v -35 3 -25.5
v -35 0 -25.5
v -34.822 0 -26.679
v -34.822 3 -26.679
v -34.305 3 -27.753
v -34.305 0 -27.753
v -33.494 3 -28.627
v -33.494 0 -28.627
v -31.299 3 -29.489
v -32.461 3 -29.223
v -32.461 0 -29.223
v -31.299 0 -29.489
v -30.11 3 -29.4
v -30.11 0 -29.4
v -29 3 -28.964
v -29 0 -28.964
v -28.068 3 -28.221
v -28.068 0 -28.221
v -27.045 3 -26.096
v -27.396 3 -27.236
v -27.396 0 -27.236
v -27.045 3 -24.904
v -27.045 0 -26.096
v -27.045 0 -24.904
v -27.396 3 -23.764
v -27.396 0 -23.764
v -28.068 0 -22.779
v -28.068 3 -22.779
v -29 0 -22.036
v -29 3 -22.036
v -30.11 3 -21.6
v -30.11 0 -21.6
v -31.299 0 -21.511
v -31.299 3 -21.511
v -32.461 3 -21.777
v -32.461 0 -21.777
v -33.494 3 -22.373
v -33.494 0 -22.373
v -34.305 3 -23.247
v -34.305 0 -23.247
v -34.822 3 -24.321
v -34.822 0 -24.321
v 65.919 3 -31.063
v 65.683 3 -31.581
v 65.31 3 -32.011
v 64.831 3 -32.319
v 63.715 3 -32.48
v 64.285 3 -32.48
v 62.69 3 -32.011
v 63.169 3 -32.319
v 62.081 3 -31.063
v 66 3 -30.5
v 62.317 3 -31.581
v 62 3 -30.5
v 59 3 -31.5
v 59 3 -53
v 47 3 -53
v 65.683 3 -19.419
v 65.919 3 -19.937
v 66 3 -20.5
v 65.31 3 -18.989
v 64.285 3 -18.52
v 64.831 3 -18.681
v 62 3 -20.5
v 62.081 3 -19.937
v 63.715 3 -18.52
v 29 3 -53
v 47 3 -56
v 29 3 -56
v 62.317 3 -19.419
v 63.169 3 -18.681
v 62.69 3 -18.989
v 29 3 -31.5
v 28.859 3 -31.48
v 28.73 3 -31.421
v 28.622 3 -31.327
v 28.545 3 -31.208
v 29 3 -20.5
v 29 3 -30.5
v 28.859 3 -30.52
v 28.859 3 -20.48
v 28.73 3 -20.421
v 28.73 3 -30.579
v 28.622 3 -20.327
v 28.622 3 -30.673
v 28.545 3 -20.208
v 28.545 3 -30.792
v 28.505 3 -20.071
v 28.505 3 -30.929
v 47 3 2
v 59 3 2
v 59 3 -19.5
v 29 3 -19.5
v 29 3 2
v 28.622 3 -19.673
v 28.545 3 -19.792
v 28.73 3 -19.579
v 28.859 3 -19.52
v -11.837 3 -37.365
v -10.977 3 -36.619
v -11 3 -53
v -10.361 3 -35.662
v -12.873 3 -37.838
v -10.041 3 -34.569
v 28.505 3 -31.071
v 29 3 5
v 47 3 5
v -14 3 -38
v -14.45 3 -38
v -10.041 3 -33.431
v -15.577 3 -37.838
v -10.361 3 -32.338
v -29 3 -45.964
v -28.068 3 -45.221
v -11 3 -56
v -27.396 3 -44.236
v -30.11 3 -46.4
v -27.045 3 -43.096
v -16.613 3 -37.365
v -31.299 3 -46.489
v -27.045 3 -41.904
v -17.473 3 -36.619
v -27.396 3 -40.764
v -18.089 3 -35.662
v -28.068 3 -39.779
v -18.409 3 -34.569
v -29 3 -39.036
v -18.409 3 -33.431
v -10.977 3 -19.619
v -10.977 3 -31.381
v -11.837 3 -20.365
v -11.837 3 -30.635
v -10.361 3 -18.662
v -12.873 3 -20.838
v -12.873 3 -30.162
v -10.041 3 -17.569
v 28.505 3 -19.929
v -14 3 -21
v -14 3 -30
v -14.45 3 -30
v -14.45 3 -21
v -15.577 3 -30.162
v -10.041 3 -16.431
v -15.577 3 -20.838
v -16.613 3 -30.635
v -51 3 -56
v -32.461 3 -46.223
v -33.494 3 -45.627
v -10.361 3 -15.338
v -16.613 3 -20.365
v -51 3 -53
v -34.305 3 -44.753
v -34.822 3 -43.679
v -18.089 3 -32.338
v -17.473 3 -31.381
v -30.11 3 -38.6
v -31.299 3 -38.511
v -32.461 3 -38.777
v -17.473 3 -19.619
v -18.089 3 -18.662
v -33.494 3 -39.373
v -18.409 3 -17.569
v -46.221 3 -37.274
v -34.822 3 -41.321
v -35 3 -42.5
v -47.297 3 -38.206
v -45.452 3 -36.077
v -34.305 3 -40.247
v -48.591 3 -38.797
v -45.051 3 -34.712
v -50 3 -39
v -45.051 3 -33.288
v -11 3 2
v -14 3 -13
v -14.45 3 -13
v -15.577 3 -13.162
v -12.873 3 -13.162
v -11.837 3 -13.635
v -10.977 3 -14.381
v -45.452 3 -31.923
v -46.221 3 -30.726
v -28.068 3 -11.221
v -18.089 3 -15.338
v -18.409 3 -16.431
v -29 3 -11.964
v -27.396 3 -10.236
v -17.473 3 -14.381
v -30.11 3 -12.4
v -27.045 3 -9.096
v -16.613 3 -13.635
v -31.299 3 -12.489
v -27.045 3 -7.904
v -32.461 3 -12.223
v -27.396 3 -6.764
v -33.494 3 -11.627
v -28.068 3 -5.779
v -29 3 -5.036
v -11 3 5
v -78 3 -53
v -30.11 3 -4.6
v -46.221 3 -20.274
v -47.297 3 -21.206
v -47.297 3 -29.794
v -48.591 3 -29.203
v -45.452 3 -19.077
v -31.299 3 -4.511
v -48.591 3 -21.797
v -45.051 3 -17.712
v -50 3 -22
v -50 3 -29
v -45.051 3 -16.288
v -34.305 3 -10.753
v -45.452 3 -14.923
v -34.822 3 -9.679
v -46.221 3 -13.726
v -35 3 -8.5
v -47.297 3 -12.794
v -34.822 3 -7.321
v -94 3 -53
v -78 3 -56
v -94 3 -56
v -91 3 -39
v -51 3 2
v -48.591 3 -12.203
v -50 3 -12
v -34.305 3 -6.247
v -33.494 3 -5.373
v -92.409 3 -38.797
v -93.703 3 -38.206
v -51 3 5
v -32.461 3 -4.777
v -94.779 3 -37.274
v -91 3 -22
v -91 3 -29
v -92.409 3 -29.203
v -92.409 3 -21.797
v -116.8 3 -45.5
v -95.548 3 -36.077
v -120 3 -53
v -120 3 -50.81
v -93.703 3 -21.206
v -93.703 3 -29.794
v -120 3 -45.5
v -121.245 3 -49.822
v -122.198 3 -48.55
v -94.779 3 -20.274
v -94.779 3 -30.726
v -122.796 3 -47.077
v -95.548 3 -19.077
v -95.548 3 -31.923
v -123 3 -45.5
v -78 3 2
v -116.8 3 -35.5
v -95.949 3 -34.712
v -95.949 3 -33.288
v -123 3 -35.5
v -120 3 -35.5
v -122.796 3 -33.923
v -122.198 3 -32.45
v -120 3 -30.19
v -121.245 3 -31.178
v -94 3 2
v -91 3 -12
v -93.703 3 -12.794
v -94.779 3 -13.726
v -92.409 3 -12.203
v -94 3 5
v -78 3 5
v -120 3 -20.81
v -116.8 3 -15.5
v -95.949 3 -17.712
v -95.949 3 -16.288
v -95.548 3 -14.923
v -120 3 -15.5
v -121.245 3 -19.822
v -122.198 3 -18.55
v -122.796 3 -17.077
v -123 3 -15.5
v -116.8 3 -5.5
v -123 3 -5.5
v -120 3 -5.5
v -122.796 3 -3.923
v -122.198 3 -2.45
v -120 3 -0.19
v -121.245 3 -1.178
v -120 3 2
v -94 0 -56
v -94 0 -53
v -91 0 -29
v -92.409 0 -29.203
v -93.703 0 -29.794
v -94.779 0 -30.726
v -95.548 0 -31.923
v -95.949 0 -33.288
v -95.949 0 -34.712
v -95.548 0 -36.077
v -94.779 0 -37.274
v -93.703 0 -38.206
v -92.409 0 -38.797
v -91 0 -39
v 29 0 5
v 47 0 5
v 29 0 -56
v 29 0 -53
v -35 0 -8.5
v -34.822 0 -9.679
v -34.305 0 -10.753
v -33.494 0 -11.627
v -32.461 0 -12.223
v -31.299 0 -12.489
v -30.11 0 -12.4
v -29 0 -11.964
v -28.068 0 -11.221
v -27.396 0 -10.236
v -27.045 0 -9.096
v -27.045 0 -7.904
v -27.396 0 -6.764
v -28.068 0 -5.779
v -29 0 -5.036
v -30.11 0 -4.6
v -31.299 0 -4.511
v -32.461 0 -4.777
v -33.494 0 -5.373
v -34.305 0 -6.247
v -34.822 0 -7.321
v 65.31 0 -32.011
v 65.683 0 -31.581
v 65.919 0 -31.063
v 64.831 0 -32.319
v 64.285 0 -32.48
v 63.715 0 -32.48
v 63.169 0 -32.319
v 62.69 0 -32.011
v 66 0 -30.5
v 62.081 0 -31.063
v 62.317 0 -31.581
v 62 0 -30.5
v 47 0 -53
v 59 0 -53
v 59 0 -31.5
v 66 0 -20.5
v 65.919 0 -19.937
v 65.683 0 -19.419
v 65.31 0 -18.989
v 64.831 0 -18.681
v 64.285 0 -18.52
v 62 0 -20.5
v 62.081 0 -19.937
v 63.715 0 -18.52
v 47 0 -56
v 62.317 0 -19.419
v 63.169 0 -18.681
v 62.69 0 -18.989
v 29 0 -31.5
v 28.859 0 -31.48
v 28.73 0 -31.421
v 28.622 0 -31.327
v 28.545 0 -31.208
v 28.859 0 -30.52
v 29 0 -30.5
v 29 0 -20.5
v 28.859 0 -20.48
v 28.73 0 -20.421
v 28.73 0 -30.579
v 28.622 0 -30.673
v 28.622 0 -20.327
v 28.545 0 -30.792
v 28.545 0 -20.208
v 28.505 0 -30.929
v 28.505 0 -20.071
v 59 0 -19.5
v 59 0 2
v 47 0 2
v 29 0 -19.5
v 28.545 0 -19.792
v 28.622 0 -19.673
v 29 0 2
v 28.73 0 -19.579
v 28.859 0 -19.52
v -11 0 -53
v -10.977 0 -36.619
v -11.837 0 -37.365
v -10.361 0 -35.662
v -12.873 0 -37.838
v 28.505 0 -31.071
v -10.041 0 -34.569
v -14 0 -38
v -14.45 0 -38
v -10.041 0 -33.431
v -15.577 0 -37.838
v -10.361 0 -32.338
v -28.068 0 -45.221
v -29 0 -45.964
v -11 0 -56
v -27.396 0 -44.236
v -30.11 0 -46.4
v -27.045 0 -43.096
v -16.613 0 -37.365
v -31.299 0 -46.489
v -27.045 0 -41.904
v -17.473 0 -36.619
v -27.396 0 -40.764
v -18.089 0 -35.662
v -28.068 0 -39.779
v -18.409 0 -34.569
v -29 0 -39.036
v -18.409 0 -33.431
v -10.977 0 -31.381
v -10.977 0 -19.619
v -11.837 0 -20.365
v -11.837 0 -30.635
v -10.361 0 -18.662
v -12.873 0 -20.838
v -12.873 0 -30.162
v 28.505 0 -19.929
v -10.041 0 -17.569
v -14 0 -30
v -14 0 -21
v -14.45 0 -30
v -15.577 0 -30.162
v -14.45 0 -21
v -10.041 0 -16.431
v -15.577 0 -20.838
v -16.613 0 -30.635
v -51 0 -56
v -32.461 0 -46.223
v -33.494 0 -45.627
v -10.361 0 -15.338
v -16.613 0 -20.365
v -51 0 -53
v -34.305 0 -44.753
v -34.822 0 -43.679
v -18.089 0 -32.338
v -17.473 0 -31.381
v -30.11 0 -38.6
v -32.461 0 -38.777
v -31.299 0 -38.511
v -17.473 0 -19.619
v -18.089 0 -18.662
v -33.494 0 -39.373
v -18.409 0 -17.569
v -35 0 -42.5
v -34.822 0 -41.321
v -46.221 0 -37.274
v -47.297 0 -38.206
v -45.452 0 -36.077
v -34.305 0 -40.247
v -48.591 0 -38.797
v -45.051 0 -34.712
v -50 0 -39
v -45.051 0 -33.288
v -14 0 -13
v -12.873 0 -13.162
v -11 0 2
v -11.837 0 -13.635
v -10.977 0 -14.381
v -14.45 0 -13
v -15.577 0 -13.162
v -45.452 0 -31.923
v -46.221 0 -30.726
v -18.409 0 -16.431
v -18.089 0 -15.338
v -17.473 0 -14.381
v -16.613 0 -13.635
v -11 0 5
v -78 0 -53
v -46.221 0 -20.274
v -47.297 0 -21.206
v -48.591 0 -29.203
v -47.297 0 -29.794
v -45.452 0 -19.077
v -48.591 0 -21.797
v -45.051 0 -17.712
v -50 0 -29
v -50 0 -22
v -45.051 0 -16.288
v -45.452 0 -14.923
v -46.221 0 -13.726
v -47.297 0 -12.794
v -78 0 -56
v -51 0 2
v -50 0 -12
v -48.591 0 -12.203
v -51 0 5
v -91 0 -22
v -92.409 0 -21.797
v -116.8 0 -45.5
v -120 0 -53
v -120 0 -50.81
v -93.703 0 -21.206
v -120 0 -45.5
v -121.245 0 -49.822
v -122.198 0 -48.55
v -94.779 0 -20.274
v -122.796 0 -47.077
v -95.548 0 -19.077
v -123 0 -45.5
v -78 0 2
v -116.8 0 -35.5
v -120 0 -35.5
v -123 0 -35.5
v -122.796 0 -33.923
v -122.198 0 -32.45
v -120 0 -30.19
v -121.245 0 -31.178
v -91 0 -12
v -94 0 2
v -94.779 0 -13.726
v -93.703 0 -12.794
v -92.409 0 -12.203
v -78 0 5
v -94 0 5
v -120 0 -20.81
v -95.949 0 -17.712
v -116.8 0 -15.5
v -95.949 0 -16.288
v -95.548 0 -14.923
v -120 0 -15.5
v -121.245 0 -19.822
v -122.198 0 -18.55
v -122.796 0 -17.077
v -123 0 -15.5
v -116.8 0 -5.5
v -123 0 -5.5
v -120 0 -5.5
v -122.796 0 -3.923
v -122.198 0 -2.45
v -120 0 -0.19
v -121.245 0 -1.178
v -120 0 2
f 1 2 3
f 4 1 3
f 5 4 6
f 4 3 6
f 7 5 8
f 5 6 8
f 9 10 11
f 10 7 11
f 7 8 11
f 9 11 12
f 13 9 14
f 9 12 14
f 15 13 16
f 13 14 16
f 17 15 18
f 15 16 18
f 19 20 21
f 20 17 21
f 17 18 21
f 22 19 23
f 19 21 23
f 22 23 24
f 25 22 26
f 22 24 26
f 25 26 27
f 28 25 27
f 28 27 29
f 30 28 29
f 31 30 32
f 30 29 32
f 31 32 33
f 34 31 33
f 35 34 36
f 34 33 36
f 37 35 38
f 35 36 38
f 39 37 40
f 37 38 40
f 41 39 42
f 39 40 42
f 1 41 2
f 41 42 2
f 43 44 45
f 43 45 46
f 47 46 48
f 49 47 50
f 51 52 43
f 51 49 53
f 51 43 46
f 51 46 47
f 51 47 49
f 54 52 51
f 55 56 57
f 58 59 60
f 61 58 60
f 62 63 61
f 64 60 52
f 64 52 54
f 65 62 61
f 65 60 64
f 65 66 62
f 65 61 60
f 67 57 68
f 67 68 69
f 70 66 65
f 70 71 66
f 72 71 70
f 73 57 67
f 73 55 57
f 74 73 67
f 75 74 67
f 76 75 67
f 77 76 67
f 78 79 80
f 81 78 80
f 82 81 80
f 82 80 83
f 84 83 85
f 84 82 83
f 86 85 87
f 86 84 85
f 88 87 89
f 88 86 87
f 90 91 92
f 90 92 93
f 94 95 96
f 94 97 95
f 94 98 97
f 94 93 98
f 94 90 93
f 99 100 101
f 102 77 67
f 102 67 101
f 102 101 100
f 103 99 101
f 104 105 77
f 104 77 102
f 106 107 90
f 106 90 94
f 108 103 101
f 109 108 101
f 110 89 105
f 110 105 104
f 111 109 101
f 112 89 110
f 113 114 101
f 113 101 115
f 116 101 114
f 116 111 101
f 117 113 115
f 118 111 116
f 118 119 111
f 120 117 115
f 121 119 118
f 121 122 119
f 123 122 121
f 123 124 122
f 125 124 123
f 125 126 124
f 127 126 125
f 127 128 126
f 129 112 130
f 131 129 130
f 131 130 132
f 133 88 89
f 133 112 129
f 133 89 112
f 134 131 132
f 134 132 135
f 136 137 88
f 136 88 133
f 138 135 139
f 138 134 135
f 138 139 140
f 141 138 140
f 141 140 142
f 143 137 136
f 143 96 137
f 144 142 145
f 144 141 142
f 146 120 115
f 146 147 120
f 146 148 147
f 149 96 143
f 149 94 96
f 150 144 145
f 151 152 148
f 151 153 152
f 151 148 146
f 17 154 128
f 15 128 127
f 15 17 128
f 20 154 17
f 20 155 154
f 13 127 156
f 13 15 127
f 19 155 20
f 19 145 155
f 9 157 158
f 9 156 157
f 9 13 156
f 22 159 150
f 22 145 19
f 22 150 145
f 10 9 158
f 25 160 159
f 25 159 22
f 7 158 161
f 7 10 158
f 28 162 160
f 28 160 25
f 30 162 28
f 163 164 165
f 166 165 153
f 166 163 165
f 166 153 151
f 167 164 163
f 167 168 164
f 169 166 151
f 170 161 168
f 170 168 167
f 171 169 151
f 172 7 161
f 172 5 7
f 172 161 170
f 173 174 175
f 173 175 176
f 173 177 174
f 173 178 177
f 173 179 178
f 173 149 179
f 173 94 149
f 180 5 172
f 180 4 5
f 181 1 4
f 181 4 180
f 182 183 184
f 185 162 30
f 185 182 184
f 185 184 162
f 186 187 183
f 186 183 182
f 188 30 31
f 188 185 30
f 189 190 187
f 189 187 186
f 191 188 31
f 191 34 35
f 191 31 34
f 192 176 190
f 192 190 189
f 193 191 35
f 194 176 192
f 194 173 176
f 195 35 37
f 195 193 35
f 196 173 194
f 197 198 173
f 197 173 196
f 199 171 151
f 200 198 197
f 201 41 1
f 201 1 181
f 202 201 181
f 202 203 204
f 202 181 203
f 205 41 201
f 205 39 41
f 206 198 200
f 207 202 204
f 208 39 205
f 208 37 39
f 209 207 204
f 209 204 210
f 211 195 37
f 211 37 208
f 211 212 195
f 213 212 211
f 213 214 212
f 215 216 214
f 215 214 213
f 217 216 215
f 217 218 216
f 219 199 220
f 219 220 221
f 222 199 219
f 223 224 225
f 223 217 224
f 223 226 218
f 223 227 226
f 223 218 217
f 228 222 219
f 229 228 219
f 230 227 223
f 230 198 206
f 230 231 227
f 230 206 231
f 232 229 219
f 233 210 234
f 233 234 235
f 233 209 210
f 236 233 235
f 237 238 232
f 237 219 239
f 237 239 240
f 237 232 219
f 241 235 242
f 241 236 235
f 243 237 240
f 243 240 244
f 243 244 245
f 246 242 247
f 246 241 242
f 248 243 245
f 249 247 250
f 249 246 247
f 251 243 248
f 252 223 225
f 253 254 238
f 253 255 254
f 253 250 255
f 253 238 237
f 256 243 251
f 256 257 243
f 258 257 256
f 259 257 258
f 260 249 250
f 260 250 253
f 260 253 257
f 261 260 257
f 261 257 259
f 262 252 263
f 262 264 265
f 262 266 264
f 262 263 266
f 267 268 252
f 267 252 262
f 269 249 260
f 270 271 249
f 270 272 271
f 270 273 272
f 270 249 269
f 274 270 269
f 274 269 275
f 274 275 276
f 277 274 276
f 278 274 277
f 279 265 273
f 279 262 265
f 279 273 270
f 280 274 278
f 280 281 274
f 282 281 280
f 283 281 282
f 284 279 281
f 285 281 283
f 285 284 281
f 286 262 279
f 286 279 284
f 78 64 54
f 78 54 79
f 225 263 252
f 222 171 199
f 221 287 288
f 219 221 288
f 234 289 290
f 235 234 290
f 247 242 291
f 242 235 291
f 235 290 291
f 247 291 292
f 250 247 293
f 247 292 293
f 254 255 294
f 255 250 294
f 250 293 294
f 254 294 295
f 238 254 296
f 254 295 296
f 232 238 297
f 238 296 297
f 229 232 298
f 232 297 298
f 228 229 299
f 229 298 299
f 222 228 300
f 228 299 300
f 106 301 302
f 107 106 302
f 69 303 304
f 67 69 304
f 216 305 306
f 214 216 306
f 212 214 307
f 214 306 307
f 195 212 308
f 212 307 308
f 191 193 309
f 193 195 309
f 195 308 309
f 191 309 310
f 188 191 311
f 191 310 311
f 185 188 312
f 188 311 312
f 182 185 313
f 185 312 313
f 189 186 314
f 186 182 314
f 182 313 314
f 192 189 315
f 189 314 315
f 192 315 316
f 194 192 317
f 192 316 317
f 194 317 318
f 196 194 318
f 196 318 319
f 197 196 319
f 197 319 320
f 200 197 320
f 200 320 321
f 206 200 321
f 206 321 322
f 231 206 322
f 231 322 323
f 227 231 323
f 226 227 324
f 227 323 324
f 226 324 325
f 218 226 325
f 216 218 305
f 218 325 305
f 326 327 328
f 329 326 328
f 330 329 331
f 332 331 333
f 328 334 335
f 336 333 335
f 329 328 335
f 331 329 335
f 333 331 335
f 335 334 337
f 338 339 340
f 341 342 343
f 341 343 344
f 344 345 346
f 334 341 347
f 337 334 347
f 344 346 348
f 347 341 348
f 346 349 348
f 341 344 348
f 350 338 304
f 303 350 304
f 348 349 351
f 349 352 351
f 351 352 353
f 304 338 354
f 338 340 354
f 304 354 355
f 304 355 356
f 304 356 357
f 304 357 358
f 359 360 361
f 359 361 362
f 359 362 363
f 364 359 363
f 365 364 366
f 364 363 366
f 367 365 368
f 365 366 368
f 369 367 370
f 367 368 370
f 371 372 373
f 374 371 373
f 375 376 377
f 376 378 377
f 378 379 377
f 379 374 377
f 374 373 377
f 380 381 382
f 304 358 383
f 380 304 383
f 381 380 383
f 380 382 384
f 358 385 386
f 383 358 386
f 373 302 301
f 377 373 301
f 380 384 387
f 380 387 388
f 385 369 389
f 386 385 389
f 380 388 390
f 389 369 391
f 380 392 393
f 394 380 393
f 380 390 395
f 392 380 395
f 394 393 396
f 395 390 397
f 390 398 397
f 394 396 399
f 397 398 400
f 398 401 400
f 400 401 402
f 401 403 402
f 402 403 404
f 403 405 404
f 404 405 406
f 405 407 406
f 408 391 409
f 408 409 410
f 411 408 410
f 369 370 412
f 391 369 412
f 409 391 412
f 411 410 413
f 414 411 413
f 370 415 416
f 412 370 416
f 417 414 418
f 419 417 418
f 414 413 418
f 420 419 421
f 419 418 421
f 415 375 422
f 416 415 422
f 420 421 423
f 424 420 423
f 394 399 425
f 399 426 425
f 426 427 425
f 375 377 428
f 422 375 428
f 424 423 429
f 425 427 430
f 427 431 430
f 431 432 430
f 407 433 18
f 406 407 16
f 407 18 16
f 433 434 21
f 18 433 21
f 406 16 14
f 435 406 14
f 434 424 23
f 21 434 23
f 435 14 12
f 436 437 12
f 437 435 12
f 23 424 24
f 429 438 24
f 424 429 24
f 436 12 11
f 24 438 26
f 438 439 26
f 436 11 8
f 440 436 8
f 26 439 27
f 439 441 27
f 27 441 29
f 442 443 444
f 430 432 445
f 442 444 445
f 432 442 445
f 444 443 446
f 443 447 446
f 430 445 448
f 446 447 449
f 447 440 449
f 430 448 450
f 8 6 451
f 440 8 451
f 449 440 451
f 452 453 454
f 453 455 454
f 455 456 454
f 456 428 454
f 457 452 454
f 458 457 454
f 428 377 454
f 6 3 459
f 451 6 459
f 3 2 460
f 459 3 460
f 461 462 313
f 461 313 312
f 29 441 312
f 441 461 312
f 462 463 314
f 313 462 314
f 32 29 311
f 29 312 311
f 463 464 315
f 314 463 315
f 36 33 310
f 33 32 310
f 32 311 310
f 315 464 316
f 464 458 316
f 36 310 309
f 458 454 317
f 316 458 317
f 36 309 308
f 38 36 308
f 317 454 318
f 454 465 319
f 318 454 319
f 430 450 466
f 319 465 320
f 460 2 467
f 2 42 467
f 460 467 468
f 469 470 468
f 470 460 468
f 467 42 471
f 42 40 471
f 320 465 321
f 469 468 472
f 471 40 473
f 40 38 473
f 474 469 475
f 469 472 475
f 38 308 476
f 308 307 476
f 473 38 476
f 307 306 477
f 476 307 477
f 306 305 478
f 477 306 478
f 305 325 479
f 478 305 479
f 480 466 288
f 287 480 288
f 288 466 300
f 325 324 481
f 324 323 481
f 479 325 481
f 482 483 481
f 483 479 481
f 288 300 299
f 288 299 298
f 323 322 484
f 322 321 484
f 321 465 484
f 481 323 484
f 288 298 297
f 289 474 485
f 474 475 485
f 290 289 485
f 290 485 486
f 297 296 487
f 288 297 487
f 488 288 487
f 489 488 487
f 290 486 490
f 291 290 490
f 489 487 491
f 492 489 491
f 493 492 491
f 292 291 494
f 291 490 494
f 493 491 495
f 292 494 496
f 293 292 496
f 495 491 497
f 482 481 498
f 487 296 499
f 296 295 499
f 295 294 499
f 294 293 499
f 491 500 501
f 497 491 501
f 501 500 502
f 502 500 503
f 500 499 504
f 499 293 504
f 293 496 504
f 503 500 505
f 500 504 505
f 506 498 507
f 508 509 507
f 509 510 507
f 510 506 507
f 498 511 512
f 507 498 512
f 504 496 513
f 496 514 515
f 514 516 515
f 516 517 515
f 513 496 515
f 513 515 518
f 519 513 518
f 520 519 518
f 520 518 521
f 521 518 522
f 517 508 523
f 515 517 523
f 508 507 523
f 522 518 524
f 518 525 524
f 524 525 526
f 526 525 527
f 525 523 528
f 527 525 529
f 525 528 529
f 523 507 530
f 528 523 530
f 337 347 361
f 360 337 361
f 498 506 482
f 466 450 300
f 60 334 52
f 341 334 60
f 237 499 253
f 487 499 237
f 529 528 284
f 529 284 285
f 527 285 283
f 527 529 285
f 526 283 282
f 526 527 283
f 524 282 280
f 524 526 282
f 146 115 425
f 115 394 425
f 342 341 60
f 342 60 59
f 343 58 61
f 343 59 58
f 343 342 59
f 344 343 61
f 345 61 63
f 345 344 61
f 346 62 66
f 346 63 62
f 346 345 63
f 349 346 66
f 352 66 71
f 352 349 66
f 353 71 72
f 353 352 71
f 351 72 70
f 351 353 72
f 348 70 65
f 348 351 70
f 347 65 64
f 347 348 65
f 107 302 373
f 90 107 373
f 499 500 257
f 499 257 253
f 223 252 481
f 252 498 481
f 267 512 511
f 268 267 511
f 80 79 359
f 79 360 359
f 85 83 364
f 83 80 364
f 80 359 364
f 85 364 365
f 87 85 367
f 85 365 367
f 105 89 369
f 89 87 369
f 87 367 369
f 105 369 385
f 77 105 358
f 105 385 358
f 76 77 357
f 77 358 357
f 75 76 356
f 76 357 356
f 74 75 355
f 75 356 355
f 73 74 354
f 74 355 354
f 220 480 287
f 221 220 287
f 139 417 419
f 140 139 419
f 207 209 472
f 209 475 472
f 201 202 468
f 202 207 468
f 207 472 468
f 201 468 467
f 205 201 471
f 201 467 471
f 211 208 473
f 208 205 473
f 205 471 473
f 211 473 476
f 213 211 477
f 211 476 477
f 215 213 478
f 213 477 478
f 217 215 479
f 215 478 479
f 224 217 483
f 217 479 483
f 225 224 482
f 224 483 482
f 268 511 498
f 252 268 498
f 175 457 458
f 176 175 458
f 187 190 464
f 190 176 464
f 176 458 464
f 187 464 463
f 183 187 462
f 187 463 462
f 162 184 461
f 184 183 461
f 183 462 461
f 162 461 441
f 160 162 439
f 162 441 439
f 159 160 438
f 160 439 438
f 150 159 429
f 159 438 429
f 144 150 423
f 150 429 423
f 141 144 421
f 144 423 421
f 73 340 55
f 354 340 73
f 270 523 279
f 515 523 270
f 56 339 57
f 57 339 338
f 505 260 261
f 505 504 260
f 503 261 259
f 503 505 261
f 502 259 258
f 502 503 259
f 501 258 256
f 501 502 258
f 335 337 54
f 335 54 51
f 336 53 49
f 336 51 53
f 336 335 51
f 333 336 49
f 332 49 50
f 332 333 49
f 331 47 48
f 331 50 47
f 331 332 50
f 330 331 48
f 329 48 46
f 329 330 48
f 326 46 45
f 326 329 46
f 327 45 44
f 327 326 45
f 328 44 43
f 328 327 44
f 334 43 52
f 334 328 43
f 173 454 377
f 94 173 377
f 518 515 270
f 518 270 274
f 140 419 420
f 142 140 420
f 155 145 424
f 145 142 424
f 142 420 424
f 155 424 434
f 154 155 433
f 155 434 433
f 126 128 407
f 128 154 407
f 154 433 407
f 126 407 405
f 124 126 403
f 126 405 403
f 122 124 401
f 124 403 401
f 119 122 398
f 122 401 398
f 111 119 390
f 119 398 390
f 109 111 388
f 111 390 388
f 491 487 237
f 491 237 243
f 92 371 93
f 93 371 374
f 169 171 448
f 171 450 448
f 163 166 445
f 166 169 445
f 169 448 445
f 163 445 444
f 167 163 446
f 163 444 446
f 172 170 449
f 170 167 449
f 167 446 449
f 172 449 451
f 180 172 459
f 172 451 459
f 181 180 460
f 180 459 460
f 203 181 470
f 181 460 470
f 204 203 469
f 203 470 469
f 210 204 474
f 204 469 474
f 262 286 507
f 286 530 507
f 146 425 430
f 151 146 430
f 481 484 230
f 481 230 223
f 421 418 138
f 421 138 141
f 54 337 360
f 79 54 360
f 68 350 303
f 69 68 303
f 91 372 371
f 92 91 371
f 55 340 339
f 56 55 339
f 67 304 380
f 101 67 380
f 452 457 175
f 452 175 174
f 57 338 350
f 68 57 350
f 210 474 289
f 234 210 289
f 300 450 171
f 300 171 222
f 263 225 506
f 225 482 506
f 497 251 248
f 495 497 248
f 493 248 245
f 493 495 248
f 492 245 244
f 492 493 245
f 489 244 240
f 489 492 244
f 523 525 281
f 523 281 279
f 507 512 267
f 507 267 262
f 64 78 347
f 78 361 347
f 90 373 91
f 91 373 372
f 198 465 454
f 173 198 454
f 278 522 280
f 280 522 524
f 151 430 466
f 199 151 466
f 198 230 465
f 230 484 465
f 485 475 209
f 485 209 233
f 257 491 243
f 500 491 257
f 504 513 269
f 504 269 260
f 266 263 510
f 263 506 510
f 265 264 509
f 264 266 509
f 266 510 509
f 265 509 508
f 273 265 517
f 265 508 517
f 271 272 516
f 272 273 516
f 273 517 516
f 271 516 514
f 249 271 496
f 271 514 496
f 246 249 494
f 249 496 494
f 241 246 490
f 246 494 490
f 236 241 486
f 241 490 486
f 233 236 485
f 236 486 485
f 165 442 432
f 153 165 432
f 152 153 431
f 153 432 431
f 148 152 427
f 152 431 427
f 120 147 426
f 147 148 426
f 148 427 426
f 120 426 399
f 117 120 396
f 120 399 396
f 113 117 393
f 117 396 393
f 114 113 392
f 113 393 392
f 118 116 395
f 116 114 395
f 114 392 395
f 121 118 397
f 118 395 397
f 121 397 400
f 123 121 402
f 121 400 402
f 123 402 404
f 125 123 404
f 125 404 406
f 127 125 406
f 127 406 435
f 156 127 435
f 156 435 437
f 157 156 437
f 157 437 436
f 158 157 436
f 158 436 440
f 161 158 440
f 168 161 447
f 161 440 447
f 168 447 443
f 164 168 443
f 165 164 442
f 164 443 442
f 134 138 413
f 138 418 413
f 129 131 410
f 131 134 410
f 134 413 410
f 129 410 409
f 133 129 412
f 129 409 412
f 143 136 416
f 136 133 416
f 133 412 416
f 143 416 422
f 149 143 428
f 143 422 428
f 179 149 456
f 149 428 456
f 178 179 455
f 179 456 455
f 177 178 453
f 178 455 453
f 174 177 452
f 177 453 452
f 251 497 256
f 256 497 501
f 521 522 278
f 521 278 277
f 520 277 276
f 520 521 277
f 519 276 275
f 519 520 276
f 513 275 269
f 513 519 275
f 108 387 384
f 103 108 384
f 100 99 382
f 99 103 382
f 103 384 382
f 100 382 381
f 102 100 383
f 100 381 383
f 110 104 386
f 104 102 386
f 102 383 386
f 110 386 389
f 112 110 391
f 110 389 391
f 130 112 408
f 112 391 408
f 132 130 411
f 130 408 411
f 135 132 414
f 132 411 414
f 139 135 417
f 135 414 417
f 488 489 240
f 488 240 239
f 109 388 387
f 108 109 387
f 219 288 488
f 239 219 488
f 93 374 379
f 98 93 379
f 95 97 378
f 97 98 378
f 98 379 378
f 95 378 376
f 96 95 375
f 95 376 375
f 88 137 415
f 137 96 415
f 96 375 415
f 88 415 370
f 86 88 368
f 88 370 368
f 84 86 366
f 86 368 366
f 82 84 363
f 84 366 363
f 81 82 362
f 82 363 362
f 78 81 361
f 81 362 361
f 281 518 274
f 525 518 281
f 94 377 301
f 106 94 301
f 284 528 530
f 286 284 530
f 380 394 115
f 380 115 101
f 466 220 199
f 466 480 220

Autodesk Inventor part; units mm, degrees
ref_plane "YZ Plane" through (0, 0, 0) normal (1, 0, 0) x (0, 1, 0)
ref_plane "XZ Plane" through (0, 0, 0) normal (0, 1, 0) x (-1, 0, 0)
ref_plane "XY Plane" through (0, 0, 0) normal (0, 0, 1) x (1, 0, 0)
sketch "Sketch1" plane through (0, 0, 0) normal (0, 1, 0) x (-1, 0, 0)
  line L0 (37.5, -2) -> (24.5, -2) construction
  line L1 (24.5, -2) -> (24.5, -15) construction
  line L2 (24.5, -15) -> (37.5, -15) construction
  line L3 (37.5, -15) -> (37.5, -2) construction
  line L4 (56.9183, -8.5) -> (8.3915, -8.5) construction
  line L5 (0, -17) -> (105, -17) construction
  line L6 (0, 0) -> (0, -51) construction
  line L7 (0, -34) -> (105, -34) construction
  line L8 (105, -51) -> (105, 0) construction
  line L9 (31, 55.8243) -> (31, -51) construction
  line L10 (56.8064, -25.5) -> (17, -25.5) construction
  line L11 (24.5, -19) -> (24.5, -32) construction
  line L12 (37.5, -19) -> (24.5, -19) construction
  line L13 (37.5, -32) -> (37.5, -19) construction
  line L14 (24.5, -32) -> (37.5, -32) construction
  line L15 (24.5, -36) -> (24.5, -49) construction
  line L16 (37.5, -36) -> (24.5, -36) construction
  line L17 (37.5, -49) -> (37.5, -36) construction
  line L18 (24.5, -49) -> (37.5, -49) construction
  line L19 (56.3008, -42.5) -> (16.5498, -42.5) construction
  arc A0 (50, -12) -> (50, -22) centre (50, -17) ccw
  arc A1 (91, -22) -> (91, -12) centre (91, -17) ccw
  arc A2 (50, -29) -> (50, -39) centre (50, -34) ccw
  arc A3 (91, -39) -> (91, -29) centre (91, -34) ccw
  line L20 (50, -12) -> (91, -12)
  line L21 (50, -22) -> (91, -22)
  line L22 (50, -29) -> (91, -29)
  line L23 (50, -39) -> (91, -39)
  arc A4 (14.45, -38) -> (14.45, -30) centre (14.45, -34) ccw
  line L24 (103.5, -49.5) -> (103.5, -1.5) construction
  line L25 (1.5, -1.5) -> (1.5, -49.5) construction
  arc A5 (14, -30) -> (14, -38) centre (14, -34) ccw
  arc A6 (14, -13) -> (14, -21) centre (14, -17) ccw
  line L26 (14.45, -38) -> (14, -38)
  line L27 (14, -30) -> (14.45, -30)
  line L28 (14, -21) -> (14.45, -21)
  line L29 (14.45, -13) -> (14, -13)
  arc A7 (14.45, -21) -> (14.45, -13) centre (14.45, -17) ccw
  arc A8 (96.5, -51) -> (93, -47.5) centre (93, -51) ccw construction
  arc A9 (50, -47.5) -> (46.5, -51) centre (50, -51) ccw construction
  arc A10 (97.7697, -49.5) -> (93, -46) centre (93, -51) ccw construction
  line L30 (93, -46) -> (50, -46) construction
  line L31 (96.5, -51) -> (105, -51) construction
  line L32 (93, -47.5) -> (50, -47.5) construction
  line L33 (105, -49.5) -> (97.7697, -49.5) construction
  arc A11 (50, -46) -> (45.2303, -49.5) centre (50, -51) ccw construction
  arc A12 (45.2303, -1.5) -> (50, -5) centre (50, 0) ccw construction
  arc A13 (46.5, 0) -> (50, -3.5) centre (50, 0) ccw construction
  line L34 (93, -3.5) -> (50, -3.5) construction
  line L35 (93, -5) -> (50, -5) construction
  line L36 (97.7697, -1.5) -> (105, -1.5) construction
  line L37 (105, 0) -> (96.5, 0) construction
  arc A14 (93, -3.5) -> (96.5, 0) centre (93, 0) ccw construction
  arc A15 (93, -5) -> (97.7697, -1.5) centre (93, 0) ccw construction
  arc A16 (17.95, -51) -> (14.45, -47.5) centre (14.45, -51) ccw construction
  arc A17 (12, -47.5) -> (8.5, -51) centre (12, -51) ccw construction
  line L38 (14.45, -46) -> (12, -46) construction
  line L39 (14.45, -47.5) -> (12, -47.5) construction
  arc A18 (12, -46) -> (7.2303, -49.5) centre (12, -51) ccw construction
  arc A19 (19.2197, -49.5) -> (14.45, -46) centre (14.45, -51) ccw construction
  line L40 (45.2303, -49.5) -> (19.2197, -49.5) construction
  line L41 (7.2303, -49.5) -> (0, -49.5) construction
  line L42 (0, -51) -> (8.5, -51) construction
  line L43 (17.95, -51) -> (46.5, -51) construction
  line L44 (14.45, -5) -> (12, -5) construction
  line L45 (14.45, -3.5) -> (12, -3.5) construction
  arc A20 (8.5, 0) -> (12, -3.5) centre (12, 0) ccw construction
  arc A21 (14.45, -3.5) -> (17.95, 0) centre (14.45, 0) ccw construction
  arc A22 (7.2303, -1.5) -> (12, -5) centre (12, 0) ccw construction
  arc A23 (14.45, -5) -> (19.2197, -1.5) centre (14.45, 0) ccw construction
  line L46 (46.5, 0) -> (17.95, 0) construction
  line L47 (8.5, 0) -> (0, 0) construction
  line L48 (0, -1.5) -> (7.2303, -1.5) construction
  line L49 (19.2197, -1.5) -> (45.2303, -1.5) construction
  arc A24 (39, -4) -> (35.5, -0.5) centre (35.5, -4) ccw construction
  arc A25 (26.5, -0.5) -> (23, -4) centre (26.5, -4) ccw construction
  arc A26 (35.5, -50.5) -> (39, -47) centre (35.5, -47) ccw construction
  arc A27 (23, -47) -> (26.5, -50.5) centre (26.5, -47) ccw construction
  line L50 (39, -4) -> (39, -47) construction
  line L51 (35.5, -0.5) -> (26.5, -0.5) construction
  line L52 (23, -4) -> (23, -47) construction
  line L53 (26.5, -50.5) -> (35.5, -50.5) construction
  line L54 (51, 5) -> (51, 2)
  line L55 (78, 5) -> (78, 2)
  line L56 (94, 5) -> (94, 2)
  line L57 (11, 5) -> (11, 2)
  line L58 (-29, 2) -> (-29, 5)
  line L59 (51, -56) -> (51, -53)
  line L60 (11, -56) -> (11, -53)
  line L61 (-29, -56) -> (-29, -53)
  line L62 (78, -56) -> (78, -53)
  line L63 (94, -56) -> (94, -53)
  line L64 (-47, 5) -> (-47, 2)
  line L65 (-47, -53) -> (-47, -56)
  line L66 (11, 2) -> (-29, 2)
  line L67 (120, 2) -> (94, 2)
  line L68 (78, 2) -> (51, 2)
  line L69 (51, -53) -> (78, -53)
  line L70 (94, -53) -> (120, -53)
  line L71 (-29, -53) -> (11, -53)
  line L72 (-47, 2) -> (-59, 2)
  line L73 (-59, -53) -> (-47, -53)
  circle A28 centre (31, -8.5) radius 4
  circle A29 centre (31, -25.5) radius 4
  circle A30 centre (31, -42.5) radius 4
  line L74 (51, 5) -> (11, 5)
  line L75 (-29, 5) -> (-47, 5)
  line L76 (-47, -56) -> (-29, -56)
  line L77 (11, -56) -> (51, -56)
  line L78 (78, -56) -> (94, -56)
  line L79 (-59, 2) -> (-59, -19.5)
  line L80 (-59, -31.5) -> (-59, -53)
  line L81 (120, -5.5) -> (116.8, -5.5)
  line L82 (116.8, -5.5) -> (116.8, -15.5)
  line L83 (116.8, -15.5) -> (120, -15.5)
  line L84 (120, -15.5) -> (120, -5.5)
  line L85 (120, -35.5) -> (116.8, -35.5)
  line L86 (116.8, -35.5) -> (116.8, -45.5)
  line L87 (116.8, -45.5) -> (120, -45.5)
  line L88 (120, -45.5) -> (120, -35.5)
  line L89 (-59, -19.5) -> (-29, -19.5)
  arc A31 (-29, -20.5) -> (-29, -19.5) centre (-29, -20) ccw
  line L90 (-29, -20.5) -> (-62, -20.5)
  line L91 (-62, -30.5) -> (-29, -30.5)
  arc A32 (-29, -31.5) -> (-29, -30.5) centre (-29, -31) ccw
  line L92 (-59, -31.5) -> (-29, -31.5)
  arc A33 (-62, -20.5) -> (-66, -20.5) centre (-64, -20.5) ccw
  arc A34 (-66, -30.5) -> (-62, -30.5) centre (-64, -30.5) ccw
  line L93 (-66, -30.5) -> (-66, -20.5)
  arc A35 (120, -50.8104) -> (123, -45.5) centre (116.8, -45.5) ccw
  arc A36 (123, -5.5) -> (120, -0.1896) centre (116.8, -5.5) ccw
  line L94 (120, -0.1896) -> (120, 2)
  line L95 (120, -50.8104) -> (120, -53)
  arc A37 (123, -35.5) -> (120, -30.1896) centre (116.8, -35.5) ccw
  arc A38 (120, -20.8104) -> (123, -15.5) centre (116.8, -15.5) ccw
  line L96 (120, -20.8104) -> (120, -30.1896)
  line L97 (123, -45.5) -> (123, -35.5)
  line L98 (123, -15.5) -> (123, -5.5)
  line L99 (94, 5) -> (78, 5)
  dimension "d0" = 13
  dimension "d2" = 17
  dimension "d3" = 31
  dimension "d4" = 105
  dimension "d5" = 17
  dimension "d6" = 17
  dimension "d7" = 10
  dimension "d8" = 1.5
  dimension "d9" = 1.5
  dimension "d10" = 4
  dimension "d11" = 1.5
  dimension "d12" = 1.5
  dimension "d13" = 1.5
  dimension "d14" = 17
  dimension "d15" = 17
  dimension "d16" = 12
  dimension "d17" = 14
  dimension "d19" = 12
  dimension "d20" = 2
  dimension "d21" = 2
  dimension "d22" = 7
  dimension "d23" = 2
  dimension "d24" = 2
  dimension "d25" = 40
  dimension "d26" = 40
  dimension "d27" = 18
  dimension "d30" = 2
  dimension "d31" = 14
  dimension "d33" = 19
  dimension "d38" = 55
  dimension "d39" = 8
  dimension "d46" = 3
  dimension "d52" = 12
  dimension "d53" = 10
  dimension "d54" = 3.2
  dimension "d56" = 20
  dimension "d57" = 30
  dimension "d58" = 1
  dimension "d59" = 10
  dimension "d60" = 4
  dimension "d62" = 3
  dimension "d64" = 3
  dimension "d67" = 27
  dimension "d68" = 16
  dimension "d71" = 26
  dimension "d72" = 16.55
extrude "Extrusion1" add sketch "Sketch1" along normal blind 3
properties part number "Bottom_plate2" material "Polycarbonate, Clear"
